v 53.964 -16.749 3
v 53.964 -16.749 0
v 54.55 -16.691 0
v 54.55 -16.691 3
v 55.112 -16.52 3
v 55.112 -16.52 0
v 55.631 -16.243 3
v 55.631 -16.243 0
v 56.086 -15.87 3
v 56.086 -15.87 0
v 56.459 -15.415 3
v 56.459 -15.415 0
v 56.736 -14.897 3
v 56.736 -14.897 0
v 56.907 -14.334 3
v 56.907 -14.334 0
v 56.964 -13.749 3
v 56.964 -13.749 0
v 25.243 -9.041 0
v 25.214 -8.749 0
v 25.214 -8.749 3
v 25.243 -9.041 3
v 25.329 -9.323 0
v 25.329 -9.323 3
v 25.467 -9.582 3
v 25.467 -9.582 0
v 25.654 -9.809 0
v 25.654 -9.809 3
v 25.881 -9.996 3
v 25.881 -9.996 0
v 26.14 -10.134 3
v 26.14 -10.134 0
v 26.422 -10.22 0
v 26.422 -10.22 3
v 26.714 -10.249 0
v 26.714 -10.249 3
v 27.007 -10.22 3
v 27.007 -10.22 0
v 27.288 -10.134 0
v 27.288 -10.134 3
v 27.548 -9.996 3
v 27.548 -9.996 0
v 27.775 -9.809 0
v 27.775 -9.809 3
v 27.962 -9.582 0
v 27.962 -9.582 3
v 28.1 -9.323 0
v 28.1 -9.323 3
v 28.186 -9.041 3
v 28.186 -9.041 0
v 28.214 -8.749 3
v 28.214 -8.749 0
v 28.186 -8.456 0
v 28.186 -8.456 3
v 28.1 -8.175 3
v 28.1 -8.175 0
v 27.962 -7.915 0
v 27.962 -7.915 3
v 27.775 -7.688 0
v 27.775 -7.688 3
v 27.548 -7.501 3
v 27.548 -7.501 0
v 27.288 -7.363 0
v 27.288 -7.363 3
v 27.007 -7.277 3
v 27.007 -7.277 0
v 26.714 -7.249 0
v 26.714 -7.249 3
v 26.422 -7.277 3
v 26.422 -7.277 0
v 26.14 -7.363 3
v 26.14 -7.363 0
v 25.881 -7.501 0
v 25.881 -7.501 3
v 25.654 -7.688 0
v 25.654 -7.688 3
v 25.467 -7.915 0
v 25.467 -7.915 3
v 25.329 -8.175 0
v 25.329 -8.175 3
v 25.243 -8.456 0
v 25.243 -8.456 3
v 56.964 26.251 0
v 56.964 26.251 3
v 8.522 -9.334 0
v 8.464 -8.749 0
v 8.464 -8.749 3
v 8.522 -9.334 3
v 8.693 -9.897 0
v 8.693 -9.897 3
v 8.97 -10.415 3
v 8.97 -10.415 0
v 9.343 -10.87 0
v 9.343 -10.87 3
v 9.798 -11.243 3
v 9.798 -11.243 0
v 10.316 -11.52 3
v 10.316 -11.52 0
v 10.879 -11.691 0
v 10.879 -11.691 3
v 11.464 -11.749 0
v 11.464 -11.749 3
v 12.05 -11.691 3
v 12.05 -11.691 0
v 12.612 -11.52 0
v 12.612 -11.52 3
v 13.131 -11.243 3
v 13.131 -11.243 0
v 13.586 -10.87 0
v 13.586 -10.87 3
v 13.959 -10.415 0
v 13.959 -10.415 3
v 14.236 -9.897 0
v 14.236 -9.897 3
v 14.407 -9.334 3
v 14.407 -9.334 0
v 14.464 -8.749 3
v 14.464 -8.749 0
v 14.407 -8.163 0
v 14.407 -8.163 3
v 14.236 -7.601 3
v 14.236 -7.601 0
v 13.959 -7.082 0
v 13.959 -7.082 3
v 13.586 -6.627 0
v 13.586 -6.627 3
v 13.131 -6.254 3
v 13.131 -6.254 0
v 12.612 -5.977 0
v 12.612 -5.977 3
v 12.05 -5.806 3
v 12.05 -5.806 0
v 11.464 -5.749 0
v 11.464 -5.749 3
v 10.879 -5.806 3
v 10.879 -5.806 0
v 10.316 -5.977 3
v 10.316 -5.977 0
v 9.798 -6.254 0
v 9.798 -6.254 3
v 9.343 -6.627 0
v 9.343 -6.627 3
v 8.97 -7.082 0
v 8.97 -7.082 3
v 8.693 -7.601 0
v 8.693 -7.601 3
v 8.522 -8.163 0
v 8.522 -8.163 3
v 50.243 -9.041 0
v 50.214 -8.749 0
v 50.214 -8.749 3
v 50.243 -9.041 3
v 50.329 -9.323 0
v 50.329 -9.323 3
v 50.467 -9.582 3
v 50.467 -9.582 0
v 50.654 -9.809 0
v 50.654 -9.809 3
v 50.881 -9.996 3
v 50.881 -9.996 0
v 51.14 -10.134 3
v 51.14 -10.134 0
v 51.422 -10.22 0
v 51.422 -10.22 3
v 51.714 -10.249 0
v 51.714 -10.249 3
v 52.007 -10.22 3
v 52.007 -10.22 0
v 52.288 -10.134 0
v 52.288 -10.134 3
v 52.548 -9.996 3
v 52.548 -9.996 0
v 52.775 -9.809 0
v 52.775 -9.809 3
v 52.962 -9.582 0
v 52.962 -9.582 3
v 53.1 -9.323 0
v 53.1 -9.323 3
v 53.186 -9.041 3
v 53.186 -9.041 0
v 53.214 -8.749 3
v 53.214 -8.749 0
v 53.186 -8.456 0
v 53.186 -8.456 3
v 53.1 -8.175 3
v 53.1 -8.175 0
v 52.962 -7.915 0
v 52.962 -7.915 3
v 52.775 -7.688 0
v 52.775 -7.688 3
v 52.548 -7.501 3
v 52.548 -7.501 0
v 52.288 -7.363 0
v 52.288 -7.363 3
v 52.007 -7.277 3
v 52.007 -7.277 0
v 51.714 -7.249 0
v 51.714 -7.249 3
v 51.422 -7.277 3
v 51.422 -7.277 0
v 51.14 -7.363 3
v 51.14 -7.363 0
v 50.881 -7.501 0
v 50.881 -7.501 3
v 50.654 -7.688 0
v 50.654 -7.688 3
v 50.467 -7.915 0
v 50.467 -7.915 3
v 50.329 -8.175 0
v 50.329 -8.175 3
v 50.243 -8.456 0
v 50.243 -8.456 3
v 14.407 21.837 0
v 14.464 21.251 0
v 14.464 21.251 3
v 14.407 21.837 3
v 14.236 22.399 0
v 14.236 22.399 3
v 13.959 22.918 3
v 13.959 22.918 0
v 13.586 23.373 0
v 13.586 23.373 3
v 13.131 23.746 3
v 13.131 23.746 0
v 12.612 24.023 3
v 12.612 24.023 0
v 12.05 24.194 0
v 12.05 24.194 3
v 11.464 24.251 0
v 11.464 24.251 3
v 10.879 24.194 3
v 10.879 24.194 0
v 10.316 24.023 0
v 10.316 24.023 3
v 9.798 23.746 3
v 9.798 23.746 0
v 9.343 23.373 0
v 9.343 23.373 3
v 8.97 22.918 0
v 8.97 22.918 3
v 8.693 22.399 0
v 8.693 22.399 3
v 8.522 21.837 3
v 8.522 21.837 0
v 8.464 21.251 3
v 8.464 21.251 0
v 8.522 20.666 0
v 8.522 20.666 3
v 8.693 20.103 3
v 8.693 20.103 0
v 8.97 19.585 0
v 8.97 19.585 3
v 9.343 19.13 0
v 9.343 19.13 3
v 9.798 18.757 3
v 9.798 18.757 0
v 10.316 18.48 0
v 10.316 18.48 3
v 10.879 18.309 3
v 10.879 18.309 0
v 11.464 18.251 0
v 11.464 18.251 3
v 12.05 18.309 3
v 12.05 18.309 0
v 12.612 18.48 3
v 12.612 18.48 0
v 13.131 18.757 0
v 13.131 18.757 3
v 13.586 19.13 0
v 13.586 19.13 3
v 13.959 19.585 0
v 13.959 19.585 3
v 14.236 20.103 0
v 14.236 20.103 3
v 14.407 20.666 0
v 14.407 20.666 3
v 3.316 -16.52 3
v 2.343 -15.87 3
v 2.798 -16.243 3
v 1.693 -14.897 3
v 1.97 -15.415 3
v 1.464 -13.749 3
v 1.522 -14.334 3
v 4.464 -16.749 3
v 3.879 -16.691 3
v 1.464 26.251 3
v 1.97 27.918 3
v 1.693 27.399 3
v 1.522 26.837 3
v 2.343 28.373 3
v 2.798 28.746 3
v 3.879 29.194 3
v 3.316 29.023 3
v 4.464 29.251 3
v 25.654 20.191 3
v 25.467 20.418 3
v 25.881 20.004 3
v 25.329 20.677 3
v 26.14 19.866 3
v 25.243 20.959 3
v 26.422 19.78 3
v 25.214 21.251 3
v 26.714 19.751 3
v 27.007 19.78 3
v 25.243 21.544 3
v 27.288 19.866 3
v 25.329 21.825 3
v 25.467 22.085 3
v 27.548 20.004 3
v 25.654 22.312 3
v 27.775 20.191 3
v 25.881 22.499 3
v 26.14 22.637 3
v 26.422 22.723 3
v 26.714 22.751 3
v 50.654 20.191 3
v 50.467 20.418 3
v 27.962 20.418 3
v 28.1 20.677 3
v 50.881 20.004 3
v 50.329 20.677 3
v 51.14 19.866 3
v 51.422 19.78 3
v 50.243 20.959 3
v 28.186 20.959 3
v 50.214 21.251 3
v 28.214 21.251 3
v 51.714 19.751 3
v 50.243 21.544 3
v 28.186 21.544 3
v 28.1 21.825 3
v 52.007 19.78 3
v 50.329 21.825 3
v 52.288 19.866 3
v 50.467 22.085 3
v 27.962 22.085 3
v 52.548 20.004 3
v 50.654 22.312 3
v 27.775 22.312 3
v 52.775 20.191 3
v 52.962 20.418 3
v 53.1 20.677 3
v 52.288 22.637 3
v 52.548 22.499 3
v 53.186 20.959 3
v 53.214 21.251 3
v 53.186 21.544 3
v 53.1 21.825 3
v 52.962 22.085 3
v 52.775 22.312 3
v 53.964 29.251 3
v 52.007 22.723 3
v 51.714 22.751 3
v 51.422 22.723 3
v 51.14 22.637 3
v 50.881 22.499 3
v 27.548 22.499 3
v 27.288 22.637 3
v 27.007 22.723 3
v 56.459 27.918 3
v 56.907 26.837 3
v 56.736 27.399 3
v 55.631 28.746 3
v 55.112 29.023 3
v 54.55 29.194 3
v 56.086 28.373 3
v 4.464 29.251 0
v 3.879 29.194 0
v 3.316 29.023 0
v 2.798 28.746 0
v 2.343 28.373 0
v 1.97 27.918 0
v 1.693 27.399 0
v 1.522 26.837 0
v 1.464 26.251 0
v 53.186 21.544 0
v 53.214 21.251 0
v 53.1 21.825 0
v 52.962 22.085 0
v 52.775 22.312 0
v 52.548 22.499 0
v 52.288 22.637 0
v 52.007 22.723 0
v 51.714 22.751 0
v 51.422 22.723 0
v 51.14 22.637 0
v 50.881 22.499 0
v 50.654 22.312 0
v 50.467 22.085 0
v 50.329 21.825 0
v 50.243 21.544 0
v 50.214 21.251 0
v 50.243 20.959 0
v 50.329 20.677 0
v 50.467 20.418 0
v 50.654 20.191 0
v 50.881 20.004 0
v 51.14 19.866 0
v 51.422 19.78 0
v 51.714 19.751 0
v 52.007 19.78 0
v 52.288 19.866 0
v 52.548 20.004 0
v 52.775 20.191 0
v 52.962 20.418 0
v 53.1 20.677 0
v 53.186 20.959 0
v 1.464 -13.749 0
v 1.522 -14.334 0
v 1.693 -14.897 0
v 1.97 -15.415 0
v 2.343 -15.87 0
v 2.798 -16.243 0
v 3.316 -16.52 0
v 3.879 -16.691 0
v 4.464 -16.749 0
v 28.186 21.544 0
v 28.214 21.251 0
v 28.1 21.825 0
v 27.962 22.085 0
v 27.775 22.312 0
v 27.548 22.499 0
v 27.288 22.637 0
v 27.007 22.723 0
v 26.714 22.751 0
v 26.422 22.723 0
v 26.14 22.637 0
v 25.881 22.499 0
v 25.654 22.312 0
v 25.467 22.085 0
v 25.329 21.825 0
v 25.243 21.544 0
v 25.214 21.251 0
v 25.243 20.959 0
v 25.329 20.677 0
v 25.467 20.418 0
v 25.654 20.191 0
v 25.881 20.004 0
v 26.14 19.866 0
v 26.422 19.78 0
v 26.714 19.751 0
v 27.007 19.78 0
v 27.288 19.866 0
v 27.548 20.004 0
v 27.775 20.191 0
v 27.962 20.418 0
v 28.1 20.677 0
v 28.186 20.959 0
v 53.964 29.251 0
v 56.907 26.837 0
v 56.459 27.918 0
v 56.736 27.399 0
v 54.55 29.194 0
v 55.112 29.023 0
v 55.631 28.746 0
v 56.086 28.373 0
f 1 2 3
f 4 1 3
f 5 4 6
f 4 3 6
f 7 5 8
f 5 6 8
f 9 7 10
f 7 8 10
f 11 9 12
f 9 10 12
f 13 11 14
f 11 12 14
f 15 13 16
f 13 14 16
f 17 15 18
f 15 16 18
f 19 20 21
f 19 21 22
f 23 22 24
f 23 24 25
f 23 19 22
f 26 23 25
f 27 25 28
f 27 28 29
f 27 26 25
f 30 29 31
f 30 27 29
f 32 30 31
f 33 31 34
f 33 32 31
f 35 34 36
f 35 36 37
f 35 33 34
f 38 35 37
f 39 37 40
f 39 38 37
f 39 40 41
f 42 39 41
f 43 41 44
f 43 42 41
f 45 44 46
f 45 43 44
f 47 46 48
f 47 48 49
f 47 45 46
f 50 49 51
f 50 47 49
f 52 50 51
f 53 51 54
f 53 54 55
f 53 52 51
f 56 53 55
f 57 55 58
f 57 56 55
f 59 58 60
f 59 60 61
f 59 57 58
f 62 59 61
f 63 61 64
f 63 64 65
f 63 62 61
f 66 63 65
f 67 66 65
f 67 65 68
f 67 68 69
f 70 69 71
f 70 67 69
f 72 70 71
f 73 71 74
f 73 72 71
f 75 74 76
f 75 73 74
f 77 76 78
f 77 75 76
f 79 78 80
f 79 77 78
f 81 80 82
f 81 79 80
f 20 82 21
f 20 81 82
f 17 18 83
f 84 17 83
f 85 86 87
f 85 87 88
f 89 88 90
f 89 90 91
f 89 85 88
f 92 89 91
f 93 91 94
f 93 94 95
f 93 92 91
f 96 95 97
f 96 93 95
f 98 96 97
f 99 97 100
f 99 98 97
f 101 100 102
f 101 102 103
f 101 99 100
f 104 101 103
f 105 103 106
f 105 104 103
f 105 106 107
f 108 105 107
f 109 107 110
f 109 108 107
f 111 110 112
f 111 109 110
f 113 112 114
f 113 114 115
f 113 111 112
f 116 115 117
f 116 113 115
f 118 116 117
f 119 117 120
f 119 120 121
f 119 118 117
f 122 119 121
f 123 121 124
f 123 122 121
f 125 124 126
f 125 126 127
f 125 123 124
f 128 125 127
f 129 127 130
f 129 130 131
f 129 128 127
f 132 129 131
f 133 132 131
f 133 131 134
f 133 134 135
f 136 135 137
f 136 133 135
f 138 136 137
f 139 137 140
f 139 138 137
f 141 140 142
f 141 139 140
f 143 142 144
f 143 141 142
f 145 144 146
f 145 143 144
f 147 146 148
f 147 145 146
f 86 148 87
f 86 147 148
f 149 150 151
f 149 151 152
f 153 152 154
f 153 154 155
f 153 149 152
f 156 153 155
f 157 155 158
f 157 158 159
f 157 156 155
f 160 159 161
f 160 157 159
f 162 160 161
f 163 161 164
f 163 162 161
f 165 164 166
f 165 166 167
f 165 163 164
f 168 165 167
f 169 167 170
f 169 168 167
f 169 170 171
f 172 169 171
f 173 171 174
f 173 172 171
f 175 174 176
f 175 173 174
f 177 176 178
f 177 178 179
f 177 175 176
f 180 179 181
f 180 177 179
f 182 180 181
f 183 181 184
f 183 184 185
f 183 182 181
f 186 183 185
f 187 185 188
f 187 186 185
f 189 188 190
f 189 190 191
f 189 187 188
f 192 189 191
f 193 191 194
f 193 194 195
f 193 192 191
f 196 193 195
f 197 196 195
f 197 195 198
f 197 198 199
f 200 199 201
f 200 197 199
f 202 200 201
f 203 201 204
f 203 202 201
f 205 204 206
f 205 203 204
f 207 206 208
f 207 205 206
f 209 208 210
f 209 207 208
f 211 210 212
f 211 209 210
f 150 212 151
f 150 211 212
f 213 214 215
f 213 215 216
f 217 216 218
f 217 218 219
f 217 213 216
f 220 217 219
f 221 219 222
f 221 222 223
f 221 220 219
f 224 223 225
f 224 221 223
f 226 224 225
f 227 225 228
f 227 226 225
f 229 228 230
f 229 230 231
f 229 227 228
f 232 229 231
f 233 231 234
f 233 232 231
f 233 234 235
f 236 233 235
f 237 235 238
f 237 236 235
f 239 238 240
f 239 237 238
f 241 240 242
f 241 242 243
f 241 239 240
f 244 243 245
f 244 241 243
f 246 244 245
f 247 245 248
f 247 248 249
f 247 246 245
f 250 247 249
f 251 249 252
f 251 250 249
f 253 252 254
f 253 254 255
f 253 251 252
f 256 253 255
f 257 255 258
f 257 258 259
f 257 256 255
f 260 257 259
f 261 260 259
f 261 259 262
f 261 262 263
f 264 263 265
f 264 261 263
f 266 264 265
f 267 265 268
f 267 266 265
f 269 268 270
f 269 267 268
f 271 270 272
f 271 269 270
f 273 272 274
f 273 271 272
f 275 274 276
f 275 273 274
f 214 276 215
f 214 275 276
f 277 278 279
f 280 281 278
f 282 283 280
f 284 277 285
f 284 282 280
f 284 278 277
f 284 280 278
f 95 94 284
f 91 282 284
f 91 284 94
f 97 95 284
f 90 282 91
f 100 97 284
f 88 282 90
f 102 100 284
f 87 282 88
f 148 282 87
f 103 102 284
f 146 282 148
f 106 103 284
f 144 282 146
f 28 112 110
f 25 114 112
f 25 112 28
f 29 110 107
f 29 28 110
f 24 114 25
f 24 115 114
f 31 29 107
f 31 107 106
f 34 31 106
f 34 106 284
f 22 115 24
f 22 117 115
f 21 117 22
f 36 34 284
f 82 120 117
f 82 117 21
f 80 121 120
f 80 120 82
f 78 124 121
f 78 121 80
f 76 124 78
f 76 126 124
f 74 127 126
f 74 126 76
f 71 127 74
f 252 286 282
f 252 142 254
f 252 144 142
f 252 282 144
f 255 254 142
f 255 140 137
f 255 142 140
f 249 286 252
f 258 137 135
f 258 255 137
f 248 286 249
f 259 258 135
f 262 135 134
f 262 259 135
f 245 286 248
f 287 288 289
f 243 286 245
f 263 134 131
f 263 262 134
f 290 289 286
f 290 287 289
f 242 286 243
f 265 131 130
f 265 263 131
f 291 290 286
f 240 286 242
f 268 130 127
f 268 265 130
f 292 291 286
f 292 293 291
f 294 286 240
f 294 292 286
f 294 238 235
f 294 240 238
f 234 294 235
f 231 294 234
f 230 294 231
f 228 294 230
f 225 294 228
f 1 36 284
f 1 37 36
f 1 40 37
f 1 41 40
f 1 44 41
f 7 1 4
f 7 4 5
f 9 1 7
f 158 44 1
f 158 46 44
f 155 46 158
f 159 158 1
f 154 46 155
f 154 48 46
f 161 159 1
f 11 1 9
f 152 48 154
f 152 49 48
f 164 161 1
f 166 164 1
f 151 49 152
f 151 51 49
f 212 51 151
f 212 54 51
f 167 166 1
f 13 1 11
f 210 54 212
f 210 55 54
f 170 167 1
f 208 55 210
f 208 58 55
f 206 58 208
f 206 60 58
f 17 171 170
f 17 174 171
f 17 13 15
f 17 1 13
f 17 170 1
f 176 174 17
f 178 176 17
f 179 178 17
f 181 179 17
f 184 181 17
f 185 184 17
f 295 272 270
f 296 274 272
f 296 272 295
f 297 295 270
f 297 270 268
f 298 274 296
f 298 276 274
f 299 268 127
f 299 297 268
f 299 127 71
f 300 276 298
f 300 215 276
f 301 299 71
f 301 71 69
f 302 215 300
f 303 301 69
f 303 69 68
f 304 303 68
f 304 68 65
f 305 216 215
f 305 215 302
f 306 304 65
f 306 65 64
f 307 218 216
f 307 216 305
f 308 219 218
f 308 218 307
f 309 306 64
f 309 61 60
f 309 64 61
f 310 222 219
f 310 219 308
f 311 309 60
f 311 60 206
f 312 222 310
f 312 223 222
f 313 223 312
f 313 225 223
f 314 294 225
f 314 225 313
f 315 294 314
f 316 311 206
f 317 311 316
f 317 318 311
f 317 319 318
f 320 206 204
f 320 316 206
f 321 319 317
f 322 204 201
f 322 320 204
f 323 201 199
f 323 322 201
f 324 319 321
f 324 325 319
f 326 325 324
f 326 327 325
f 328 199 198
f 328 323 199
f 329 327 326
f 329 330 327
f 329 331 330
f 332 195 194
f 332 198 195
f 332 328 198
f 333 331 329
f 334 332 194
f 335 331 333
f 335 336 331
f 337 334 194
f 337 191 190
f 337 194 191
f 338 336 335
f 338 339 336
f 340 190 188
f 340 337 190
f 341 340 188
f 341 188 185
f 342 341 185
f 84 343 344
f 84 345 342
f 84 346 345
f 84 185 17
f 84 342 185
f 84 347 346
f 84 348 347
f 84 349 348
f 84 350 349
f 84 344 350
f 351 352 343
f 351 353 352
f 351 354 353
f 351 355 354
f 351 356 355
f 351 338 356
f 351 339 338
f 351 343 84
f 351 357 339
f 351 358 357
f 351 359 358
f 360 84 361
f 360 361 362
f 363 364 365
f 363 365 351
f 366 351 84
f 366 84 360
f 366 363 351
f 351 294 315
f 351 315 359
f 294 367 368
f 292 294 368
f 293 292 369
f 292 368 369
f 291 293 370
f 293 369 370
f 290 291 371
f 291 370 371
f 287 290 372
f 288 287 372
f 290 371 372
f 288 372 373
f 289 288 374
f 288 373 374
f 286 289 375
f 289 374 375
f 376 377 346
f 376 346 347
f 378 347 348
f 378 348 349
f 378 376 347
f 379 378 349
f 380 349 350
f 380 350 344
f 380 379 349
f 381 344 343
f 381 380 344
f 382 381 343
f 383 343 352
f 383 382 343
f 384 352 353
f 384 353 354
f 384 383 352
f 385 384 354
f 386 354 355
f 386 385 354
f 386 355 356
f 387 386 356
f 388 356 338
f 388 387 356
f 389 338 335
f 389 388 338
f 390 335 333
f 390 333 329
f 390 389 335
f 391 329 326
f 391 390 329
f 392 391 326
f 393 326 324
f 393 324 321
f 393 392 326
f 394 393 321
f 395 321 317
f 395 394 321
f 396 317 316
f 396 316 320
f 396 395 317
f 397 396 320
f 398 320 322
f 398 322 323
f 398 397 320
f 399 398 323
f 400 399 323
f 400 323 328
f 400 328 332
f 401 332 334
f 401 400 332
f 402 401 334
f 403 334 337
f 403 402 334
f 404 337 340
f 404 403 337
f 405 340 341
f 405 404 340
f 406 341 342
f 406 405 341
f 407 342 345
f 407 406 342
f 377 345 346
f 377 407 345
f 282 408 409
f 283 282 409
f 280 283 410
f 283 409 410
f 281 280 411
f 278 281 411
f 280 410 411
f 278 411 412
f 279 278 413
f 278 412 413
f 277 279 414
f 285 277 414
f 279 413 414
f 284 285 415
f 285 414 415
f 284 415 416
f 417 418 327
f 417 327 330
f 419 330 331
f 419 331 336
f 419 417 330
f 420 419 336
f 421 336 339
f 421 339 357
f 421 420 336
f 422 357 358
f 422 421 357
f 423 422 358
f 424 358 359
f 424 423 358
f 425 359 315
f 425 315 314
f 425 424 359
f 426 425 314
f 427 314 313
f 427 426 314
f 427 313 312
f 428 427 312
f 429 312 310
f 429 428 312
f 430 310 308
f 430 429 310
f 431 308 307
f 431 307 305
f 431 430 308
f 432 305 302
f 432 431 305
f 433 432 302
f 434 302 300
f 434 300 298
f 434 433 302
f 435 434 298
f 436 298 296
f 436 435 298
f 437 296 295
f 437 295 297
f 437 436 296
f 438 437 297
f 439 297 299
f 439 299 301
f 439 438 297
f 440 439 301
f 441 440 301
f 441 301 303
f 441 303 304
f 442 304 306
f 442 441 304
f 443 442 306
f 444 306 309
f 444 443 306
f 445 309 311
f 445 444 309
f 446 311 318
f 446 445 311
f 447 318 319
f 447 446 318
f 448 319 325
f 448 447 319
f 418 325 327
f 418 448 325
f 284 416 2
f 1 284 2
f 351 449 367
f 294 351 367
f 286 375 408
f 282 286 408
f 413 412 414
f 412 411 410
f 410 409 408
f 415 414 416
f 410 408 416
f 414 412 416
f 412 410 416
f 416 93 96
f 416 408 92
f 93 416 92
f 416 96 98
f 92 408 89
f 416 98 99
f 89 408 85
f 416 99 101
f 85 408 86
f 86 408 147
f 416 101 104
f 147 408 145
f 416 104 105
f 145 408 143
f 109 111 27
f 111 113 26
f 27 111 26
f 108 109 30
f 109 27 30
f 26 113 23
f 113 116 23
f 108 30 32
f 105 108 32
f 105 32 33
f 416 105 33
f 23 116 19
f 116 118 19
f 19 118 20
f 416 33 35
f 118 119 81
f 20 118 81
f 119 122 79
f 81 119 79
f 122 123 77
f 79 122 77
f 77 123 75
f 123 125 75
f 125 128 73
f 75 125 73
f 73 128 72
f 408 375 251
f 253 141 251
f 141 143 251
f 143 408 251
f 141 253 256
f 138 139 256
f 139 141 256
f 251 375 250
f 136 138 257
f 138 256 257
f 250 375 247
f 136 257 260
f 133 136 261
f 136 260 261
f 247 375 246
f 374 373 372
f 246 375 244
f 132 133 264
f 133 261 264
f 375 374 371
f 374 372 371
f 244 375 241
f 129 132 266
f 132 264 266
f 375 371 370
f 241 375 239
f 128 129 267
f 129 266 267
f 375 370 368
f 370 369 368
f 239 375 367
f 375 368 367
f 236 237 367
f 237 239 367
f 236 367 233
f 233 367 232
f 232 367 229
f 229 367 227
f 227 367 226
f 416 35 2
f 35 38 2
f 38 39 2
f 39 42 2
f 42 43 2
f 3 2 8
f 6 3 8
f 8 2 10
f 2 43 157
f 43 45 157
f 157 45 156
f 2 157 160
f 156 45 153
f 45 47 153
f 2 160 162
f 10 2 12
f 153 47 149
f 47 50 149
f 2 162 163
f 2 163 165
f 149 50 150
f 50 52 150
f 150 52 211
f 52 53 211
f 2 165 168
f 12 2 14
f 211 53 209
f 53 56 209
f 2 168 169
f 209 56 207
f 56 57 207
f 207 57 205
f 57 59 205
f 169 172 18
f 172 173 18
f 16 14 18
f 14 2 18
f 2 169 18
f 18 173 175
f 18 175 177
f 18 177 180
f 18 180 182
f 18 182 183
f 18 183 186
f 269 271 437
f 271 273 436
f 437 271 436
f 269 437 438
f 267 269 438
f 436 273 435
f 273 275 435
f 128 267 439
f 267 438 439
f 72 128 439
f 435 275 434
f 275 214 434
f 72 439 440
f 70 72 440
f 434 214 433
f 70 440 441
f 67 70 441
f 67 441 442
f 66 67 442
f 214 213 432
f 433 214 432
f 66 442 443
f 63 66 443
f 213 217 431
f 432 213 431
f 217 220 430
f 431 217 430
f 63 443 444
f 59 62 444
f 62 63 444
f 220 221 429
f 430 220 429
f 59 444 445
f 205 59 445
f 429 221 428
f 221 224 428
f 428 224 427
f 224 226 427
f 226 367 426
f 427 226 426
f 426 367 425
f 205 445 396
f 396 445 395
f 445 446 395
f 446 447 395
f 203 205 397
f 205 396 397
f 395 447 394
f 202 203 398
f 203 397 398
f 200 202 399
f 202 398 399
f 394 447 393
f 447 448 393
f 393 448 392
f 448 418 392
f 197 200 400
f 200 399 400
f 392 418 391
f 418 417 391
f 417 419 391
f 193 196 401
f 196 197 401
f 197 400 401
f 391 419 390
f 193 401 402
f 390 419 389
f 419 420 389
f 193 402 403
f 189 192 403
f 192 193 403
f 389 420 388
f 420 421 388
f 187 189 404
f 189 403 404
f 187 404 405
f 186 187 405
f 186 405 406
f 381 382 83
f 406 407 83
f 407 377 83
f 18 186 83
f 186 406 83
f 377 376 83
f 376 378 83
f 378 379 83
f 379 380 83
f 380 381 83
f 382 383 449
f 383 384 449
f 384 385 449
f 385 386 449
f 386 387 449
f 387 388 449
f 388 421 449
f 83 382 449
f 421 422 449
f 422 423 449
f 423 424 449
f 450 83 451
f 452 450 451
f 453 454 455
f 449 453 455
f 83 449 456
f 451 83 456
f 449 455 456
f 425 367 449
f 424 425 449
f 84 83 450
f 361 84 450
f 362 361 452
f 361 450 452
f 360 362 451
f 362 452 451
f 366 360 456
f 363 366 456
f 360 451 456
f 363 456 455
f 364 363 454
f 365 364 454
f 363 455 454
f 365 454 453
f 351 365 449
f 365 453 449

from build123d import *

# Parameters (mm, degrees)
SKETCH_1_R      = 1.5
SKETCH_1_R_2    = 3
EXTRUDE_1_DEPTH = 3


with BuildPart() as part:
    # 草图1 → 凸台-拉伸1 (new body)
    with BuildSketch(Plane.XY):
        with BuildLine():
            Line((56.964417519, -13.748620871), (56.964417519, 26.251379129))
            ThreePointArc((56.964417519, 26.251379129), (56.085737863, 28.372699472), (53.964417519, 29.251379129))
            Line((53.964417519, 29.251379129), (4.464417519, 29.251379129))
            ThreePointArc((4.464417519, 29.251379129), (2.343097176, 28.372699472), (1.464417519, 26.251379129))
            Line((1.464417519, 26.251379129), (1.464417519, -13.748620871))
            ThreePointArc((1.464417519, -13.748620871), (2.343097176, -15.869941215), (4.464417519, -16.748620871))
            Line((4.464417519, -16.748620871), (53.964417519, -16.748620871))
            ThreePointArc((53.964417519, -16.748620871), (56.085737863, -15.869941215), (56.964417519, -13.748620871))
        make_face()
        with Locations((51.714417519, 21.251379129)):
            Circle(SKETCH_1_R, mode=Mode.SUBTRACT)
        with Locations((26.714417519, 21.251379129)):
            Circle(SKETCH_1_R, mode=Mode.SUBTRACT)
        with Locations(Location((26.714417519, -8.748620871, 0), (0, 0, 180))):
            Circle(SKETCH_1_R, mode=Mode.SUBTRACT)
        with Locations(Location((51.714417519, -8.748620871, 0), (0, 0, 180))):
            Circle(SKETCH_1_R, mode=Mode.SUBTRACT)
        with Locations((11.464417519, 21.251379129)):
            Circle(SKETCH_1_R_2, mode=Mode.SUBTRACT)
        with Locations(Location((11.464417519, -8.748620871, 0), (0, 0, 180))):
            Circle(SKETCH_1_R_2, mode=Mode.SUBTRACT)
    extrude(amount=EXTRUDE_1_DEPTH)


solid = part.part
